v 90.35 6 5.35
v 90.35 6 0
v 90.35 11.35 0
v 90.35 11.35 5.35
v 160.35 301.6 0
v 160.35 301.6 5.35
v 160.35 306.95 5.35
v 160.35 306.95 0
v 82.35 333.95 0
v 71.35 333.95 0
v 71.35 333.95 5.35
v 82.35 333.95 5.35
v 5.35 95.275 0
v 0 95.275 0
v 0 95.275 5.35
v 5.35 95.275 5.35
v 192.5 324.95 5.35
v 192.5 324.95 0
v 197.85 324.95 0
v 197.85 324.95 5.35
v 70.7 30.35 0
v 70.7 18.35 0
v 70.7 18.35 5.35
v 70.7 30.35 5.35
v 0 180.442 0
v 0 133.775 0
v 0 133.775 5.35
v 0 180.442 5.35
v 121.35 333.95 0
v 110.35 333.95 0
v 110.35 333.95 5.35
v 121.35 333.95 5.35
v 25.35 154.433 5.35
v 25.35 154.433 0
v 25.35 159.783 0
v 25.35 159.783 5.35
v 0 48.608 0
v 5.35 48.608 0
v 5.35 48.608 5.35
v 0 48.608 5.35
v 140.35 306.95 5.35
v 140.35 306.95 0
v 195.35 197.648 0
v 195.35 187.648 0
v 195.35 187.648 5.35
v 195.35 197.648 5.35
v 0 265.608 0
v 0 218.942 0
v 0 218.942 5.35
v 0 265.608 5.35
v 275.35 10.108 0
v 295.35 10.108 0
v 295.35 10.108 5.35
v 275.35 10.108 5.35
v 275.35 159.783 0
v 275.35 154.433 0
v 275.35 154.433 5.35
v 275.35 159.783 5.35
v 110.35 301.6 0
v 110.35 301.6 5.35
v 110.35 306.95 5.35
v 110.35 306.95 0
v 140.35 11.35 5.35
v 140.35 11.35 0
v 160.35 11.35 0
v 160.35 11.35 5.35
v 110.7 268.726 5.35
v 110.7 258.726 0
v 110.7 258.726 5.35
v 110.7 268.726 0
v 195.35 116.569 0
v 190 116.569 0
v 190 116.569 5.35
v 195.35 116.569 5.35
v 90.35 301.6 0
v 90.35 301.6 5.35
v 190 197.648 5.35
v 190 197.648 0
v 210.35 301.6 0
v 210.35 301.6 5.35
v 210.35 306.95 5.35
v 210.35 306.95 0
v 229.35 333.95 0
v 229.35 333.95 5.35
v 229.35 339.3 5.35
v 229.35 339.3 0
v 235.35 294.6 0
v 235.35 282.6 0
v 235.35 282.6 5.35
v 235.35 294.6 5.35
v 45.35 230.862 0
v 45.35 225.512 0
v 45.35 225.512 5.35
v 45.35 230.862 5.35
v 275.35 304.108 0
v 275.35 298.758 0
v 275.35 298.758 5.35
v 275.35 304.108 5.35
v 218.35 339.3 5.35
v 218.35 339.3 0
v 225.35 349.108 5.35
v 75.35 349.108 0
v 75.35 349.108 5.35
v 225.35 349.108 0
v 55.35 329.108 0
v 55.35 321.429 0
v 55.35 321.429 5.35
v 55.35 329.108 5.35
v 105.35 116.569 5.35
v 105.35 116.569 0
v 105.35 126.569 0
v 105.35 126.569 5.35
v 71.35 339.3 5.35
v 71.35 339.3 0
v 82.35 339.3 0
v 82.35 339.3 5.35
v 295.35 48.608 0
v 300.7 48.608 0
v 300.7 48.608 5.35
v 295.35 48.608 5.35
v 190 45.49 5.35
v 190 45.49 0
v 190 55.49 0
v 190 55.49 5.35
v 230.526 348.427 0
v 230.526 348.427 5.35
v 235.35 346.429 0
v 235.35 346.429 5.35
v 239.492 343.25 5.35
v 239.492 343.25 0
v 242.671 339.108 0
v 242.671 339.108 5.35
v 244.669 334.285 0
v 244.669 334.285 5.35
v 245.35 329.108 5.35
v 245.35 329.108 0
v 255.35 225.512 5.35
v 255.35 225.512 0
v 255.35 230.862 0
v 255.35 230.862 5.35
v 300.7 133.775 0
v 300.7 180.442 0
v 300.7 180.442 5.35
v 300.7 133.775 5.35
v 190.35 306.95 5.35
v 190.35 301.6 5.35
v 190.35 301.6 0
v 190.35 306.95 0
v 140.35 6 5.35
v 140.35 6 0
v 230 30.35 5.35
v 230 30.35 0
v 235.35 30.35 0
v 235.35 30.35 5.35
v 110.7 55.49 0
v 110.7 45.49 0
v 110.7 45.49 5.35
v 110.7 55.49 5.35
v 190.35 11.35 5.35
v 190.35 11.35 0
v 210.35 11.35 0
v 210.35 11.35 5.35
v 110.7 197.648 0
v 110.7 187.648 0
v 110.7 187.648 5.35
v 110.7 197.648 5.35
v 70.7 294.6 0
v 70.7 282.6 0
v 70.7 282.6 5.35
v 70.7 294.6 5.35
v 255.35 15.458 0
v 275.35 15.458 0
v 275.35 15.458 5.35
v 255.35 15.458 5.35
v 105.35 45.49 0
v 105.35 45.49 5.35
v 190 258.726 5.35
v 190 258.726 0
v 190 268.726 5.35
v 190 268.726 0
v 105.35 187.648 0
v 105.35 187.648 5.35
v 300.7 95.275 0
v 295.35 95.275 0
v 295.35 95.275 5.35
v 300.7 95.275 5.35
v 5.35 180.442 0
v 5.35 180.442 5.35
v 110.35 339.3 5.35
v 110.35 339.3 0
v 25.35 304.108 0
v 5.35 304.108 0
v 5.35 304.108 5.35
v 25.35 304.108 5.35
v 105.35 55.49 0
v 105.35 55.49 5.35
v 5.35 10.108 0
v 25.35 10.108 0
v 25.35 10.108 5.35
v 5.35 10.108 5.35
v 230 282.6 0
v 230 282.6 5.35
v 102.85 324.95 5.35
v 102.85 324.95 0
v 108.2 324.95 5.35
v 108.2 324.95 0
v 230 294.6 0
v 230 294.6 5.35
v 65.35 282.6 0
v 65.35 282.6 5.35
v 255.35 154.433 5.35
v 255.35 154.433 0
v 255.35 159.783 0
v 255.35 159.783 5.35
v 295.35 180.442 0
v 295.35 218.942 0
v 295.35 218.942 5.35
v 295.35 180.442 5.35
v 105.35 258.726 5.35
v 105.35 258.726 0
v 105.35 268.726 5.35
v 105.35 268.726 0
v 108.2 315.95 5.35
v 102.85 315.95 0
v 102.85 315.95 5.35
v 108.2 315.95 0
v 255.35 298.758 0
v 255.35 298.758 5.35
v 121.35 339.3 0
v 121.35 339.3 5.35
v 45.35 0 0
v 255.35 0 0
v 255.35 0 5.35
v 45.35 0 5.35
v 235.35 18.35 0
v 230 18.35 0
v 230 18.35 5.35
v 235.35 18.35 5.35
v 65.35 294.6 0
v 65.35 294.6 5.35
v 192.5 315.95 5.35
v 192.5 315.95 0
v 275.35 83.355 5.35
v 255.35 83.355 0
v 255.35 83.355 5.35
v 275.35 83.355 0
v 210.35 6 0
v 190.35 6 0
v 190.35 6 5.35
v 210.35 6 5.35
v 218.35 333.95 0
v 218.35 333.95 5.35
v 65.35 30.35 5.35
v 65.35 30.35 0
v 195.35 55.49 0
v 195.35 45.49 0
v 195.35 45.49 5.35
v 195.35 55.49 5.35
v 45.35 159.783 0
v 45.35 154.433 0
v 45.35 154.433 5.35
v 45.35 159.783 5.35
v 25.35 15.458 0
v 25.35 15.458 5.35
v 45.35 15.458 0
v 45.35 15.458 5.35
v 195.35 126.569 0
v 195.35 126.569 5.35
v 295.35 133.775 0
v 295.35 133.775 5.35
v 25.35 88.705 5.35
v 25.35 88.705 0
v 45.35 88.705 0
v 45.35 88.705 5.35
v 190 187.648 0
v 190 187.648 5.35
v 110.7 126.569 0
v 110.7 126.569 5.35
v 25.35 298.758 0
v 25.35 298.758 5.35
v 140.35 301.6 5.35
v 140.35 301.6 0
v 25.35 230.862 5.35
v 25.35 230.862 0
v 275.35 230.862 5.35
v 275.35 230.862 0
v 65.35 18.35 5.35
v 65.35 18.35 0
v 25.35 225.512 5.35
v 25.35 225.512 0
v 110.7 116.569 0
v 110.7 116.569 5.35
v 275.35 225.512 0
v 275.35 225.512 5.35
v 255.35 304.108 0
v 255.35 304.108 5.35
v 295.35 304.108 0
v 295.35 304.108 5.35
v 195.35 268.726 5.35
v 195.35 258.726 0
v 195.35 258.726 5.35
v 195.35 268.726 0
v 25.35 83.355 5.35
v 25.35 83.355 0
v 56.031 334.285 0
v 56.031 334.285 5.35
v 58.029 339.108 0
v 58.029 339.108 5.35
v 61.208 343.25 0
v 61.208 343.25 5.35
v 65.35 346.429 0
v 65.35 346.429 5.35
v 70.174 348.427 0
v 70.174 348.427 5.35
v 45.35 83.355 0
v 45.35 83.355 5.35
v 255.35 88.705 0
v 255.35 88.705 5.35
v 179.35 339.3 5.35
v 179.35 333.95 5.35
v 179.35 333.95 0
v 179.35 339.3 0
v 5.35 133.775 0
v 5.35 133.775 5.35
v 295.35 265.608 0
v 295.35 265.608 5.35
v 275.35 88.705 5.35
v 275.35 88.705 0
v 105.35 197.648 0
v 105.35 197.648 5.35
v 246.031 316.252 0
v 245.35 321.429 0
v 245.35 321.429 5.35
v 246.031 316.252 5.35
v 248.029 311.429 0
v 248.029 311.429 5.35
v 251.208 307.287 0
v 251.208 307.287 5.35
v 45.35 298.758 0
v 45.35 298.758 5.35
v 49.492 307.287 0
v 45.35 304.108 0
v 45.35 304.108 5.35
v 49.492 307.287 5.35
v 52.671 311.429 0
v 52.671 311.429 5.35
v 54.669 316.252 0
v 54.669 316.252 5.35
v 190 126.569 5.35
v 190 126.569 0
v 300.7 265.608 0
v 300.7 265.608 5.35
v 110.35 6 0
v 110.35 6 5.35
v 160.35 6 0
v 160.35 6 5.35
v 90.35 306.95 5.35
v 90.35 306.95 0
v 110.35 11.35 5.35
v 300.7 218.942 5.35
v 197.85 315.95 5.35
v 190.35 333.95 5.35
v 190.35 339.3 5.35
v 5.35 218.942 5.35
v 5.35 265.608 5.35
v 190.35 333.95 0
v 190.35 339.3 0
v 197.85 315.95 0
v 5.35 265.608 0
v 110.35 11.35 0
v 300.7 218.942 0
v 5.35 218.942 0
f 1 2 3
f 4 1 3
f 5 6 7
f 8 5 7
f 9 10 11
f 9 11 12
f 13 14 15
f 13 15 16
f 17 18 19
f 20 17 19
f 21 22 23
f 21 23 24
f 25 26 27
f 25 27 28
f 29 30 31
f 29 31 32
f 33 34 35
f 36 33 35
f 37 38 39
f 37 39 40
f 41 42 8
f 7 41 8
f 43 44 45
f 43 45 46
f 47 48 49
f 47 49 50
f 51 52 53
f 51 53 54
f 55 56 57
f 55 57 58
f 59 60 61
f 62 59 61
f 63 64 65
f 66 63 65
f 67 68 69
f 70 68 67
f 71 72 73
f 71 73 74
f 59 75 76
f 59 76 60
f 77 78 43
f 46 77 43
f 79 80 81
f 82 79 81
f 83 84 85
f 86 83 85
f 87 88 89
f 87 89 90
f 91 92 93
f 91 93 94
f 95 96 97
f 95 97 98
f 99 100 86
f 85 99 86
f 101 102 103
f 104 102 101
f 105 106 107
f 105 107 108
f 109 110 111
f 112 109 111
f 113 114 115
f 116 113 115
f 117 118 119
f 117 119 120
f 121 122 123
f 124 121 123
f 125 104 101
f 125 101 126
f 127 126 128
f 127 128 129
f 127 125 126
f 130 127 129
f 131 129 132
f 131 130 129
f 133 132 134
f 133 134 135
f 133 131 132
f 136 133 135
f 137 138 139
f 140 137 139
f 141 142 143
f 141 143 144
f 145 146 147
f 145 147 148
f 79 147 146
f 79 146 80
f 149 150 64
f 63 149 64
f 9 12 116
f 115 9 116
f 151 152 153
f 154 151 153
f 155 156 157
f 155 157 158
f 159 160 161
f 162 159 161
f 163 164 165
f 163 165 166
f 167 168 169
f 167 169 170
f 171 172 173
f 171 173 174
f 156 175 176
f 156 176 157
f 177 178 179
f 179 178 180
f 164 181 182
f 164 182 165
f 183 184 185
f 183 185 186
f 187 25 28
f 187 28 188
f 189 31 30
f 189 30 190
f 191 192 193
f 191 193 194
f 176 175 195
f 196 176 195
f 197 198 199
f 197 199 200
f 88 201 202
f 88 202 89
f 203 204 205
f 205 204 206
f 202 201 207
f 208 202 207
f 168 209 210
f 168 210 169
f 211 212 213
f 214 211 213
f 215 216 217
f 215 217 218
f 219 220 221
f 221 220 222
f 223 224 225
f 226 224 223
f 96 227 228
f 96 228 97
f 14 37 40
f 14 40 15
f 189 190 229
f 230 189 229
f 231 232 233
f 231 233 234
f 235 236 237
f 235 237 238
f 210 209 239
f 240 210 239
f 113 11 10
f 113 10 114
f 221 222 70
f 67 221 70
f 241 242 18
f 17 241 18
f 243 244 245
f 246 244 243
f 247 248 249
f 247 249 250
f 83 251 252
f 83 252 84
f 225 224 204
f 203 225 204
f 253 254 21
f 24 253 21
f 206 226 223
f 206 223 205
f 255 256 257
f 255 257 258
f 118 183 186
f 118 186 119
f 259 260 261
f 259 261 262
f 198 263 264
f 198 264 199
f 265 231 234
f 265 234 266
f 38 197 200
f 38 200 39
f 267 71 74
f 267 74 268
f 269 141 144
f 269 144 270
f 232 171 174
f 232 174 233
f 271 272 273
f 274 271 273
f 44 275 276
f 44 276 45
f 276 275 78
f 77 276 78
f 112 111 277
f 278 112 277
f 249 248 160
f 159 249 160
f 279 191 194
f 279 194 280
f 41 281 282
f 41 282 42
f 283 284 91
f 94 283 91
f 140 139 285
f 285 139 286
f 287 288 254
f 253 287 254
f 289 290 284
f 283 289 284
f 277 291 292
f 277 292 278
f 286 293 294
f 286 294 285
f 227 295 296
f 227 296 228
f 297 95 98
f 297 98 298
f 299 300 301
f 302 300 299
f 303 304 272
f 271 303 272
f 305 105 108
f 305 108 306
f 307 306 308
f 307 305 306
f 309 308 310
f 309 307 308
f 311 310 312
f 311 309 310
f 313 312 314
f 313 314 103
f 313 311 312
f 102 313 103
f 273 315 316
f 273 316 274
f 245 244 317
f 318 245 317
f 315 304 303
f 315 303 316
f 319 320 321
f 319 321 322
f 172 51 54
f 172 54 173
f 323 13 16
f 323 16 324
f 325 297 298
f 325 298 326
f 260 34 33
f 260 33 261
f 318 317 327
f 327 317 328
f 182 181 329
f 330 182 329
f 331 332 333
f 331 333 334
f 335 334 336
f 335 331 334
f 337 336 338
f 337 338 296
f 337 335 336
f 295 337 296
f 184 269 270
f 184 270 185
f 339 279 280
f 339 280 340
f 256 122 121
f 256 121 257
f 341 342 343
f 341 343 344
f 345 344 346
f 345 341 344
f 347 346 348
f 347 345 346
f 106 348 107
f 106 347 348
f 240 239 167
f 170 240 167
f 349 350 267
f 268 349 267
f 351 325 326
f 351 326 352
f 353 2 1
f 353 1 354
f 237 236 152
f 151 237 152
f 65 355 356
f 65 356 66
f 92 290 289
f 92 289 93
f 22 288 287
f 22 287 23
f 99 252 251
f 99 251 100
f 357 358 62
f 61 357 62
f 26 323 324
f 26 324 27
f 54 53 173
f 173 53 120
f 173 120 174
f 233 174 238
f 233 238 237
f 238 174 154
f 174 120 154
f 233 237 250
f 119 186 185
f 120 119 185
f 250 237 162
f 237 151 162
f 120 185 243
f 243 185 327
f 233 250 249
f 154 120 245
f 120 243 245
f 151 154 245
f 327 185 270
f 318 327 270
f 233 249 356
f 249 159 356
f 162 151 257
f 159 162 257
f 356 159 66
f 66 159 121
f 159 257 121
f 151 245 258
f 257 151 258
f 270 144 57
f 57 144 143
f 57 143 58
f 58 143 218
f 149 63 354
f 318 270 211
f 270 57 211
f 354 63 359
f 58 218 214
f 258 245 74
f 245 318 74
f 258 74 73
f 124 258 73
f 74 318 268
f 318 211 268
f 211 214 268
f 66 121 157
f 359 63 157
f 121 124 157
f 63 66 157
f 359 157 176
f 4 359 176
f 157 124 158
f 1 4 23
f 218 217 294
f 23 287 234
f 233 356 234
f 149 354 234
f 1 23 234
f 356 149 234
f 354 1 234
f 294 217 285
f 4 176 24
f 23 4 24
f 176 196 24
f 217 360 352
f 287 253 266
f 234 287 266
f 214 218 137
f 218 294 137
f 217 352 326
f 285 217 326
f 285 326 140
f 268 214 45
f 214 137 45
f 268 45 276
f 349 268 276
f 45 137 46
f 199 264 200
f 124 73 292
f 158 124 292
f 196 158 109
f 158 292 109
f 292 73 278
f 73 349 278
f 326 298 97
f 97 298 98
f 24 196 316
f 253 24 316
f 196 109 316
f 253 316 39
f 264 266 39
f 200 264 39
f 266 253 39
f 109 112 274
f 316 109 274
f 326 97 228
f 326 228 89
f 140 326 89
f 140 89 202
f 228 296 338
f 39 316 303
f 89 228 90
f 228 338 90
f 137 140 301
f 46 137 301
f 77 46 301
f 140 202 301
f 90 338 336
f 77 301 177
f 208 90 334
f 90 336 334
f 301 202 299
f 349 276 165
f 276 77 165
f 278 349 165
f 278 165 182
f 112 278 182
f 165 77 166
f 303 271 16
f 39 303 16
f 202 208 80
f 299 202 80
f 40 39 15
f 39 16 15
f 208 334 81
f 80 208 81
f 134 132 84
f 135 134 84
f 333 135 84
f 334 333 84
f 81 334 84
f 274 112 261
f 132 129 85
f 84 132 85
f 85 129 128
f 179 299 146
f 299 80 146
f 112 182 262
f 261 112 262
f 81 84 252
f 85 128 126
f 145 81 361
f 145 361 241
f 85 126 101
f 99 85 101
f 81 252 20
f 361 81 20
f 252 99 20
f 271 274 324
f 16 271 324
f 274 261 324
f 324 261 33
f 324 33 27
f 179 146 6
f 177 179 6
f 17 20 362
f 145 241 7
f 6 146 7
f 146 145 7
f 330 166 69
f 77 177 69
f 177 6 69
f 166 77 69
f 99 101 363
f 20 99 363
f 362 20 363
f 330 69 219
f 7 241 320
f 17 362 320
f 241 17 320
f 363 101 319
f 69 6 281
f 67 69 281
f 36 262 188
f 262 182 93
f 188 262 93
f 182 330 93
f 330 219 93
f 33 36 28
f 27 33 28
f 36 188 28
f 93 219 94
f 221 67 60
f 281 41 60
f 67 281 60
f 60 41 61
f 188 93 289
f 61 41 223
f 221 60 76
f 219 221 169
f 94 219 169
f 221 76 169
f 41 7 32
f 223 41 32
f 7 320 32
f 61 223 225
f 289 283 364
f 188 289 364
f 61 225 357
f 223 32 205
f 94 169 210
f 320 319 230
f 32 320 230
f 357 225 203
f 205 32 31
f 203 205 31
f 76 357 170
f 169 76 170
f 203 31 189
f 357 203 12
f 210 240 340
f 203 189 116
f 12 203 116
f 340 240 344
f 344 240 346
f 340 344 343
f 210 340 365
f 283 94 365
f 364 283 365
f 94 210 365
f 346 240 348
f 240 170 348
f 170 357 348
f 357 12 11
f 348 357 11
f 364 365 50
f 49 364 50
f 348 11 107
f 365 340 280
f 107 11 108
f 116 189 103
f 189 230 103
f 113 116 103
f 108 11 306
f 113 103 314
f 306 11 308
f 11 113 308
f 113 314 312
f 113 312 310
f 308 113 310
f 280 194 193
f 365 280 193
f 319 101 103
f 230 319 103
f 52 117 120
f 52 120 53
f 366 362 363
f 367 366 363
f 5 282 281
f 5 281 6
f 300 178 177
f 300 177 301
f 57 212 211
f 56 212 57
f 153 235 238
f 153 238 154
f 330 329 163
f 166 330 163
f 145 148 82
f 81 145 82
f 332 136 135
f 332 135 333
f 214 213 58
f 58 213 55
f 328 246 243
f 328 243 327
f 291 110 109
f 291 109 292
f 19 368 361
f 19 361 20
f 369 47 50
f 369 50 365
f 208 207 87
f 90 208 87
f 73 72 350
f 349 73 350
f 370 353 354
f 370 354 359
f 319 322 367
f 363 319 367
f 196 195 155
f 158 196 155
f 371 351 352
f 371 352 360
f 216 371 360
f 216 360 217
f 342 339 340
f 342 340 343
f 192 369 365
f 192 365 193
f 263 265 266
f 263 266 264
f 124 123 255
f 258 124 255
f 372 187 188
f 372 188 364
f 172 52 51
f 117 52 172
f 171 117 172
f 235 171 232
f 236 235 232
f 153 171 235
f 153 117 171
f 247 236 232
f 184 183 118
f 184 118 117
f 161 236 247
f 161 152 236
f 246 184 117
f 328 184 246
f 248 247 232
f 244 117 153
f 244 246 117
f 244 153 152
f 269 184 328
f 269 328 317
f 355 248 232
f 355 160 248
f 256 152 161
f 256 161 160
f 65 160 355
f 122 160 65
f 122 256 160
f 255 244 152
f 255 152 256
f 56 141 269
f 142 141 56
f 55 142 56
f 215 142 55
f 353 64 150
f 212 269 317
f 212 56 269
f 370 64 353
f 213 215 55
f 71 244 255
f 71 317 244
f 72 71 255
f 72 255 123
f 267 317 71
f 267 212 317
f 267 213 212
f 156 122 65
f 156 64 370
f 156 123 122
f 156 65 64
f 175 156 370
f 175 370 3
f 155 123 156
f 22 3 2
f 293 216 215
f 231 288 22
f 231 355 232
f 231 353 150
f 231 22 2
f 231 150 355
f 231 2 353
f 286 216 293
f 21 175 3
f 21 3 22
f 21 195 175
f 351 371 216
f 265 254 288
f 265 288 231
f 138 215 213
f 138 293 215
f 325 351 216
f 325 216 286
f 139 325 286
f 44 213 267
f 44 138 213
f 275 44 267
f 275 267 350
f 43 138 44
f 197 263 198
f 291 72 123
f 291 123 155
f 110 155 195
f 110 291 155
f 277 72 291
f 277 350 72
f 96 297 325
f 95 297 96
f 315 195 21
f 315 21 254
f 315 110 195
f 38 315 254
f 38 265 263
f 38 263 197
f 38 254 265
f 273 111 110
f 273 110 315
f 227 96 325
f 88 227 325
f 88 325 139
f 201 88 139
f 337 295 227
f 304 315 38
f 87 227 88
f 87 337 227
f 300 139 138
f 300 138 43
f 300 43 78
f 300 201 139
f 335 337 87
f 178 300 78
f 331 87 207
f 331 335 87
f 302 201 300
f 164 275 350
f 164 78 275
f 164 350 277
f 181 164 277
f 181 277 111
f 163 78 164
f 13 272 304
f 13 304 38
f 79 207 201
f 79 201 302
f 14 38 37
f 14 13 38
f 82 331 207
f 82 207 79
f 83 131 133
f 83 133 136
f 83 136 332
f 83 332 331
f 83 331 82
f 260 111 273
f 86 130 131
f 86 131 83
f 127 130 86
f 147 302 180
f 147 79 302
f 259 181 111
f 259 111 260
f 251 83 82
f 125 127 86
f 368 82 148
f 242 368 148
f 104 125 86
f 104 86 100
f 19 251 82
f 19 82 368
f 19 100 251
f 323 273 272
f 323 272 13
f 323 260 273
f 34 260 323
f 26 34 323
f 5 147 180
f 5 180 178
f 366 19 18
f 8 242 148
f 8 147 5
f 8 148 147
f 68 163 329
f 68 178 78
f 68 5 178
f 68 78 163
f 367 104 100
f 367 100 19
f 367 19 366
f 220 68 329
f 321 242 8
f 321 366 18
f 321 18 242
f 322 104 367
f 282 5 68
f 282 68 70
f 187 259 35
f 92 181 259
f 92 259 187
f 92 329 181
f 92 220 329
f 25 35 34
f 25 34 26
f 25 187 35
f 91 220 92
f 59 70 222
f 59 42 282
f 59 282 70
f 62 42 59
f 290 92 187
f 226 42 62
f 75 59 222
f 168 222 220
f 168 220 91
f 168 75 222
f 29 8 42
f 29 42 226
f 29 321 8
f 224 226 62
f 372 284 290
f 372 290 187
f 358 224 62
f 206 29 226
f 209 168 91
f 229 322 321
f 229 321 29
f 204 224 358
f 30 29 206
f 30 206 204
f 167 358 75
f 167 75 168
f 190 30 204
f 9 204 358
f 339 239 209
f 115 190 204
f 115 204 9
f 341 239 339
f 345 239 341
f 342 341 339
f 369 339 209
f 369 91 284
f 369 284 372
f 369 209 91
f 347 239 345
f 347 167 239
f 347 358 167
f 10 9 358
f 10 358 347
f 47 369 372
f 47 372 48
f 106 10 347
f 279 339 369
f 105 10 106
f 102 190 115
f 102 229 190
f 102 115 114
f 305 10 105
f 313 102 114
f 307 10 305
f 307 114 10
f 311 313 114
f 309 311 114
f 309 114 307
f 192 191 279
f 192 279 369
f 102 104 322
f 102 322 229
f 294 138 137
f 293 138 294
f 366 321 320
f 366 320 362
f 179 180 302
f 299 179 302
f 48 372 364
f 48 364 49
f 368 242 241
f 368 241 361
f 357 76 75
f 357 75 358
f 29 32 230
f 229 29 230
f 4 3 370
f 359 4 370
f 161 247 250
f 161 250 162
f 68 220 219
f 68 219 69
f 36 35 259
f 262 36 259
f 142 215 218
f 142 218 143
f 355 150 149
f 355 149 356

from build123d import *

# Parameters (mm, degrees)
MODEL_W             = 10.99999994
MODEL_H             = 5.349999293
MODEL_W_2           = 5.350001157
MODEL_H_2           = 10.000001639
MODEL_H_3           = 9.999997913
MODEL_H_4           = 10.000005364
MODEL_H_5           = 9.999990463
MODEL_W_3           = 19.999999553
MODEL_H_6           = 5.350001156
MODEL_H_7           = 5.349993706
MODEL_H_8           = 5.350008607
MODEL_W_4           = 5.350001156
MODEL_H_9           = 8.999999612
MODEL_W_5           = 5.350004882
MODEL_H_10          = 12.000000104
MODEL_W_6           = 19.999988377
MODEL_W_7           = 19.999995828
MODEL_H_11          = 5.349999992
MODEL_H_12          = 11.999994516
MODEL_W_8           = 10.999999941
BOSS_EXTRUDE1_DEPTH = 5.35


with BuildPart() as part:
    # Model → Boss-Extrude1 (new body)
    with BuildSketch(Plane.XY):
        with BuildLine():
            Line((295.349999331, 304.108172655), (295.349999331, 265.608172864))
            Line((295.349999331, 265.608172864), (300.699999556, 265.608172864))
            Line((300.699999556, 265.608172864), (300.699999556, 218.941502273))
            Line((300.699999556, 218.941502273), (295.349999331, 218.941502273))
            Line((295.349999331, 218.941502273), (295.349999331, 180.441506207))
            Line((295.349999331, 180.441506207), (300.699999556, 180.441506207))
            Line((300.699999556, 180.441506207), (300.699999556, 133.774831891))
            Line((300.699999556, 133.774831891), (295.349999331, 133.774831891))
            Line((295.349999331, 133.774831891), (295.349999331, 95.274835825))
            Line((295.349999331, 95.274835825), (300.699999556, 95.274835825))
            Line((300.699999556, 95.274835825), (300.699999556, 48.608183861))
            Line((300.699999556, 48.608183861), (295.349999331, 48.608183861))
            Line((295.349999331, 48.608183861), (295.349999331, 10.108172894))
            Line((295.349999331, 10.108172894), (275.349999778, 10.108172894))
            Line((275.349999778, 10.108172894), (275.349999778, 15.458166599))
            Line((275.349999778, 15.458166599), (255.350000225, 15.458166599))
            Line((255.350000225, 15.458166599), (255.350000225, 0))
            Line((255.350000225, 0), (45.349999331, 0))
            Line((45.349999331, 0), (45.349999331, 15.458166599))
            Line((45.349999331, 15.458166599), (25.349999778, 15.458166599))
            Line((25.349999778, 15.458166599), (25.349999778, 10.108172894))
            Line((25.349999778, 10.108172894), (5.350000225, 10.108172894))
            Line((5.350000225, 10.108172894), (5.350000225, 48.608183861))
            Line((5.350000225, 48.608183861), (0, 48.608183861))
            Line((0, 48.608183861), (0, 95.274835825))
            Line((0, 95.274835825), (5.350000225, 95.274835825))
            Line((5.350000225, 95.274835825), (5.350000225, 133.774831891))
            Line((5.350000225, 133.774831891), (0, 133.774831891))
            Line((0, 133.774831891), (0, 180.441506207))
            Line((0, 180.441506207), (5.350000225, 180.441506207))
            Line((5.350000225, 180.441506207), (5.350000225, 218.941502273))
            Line((5.350000225, 218.941502273), (0, 218.941502273))
            Line((0, 218.941502273), (0, 265.608172864))
            Line((0, 265.608172864), (5.350000225, 265.608172864))
            Line((5.350000225, 265.608172864), (5.350000225, 304.108172655))
            Line((5.350000225, 304.108172655), (25.349999778, 304.108172655))
            Line((25.349999778, 304.108172655), (25.349999778, 298.75817243))
            Line((25.349999778, 298.75817243), (45.349999331, 298.75817243))
            Line((45.349999331, 298.75817243), (45.349999331, 304.108172655))
            ThreePointArc((45.349999331, 304.108172655), (52.670508573, 311.428680858), (55.35000097, 321.428681677))
            Line((55.35000097, 321.428681677), (55.35000097, 329.108174443))
            ThreePointArc((55.35000097, 329.108174443), (61.207865188, 343.250309909), (75.350000523, 349.108174443))
            Line((75.350000523, 349.108174443), (225.349999033, 349.108174443))
            ThreePointArc((225.349999033, 349.108174443), (239.492134368, 343.250309909), (245.349998586, 329.108174443))
            Line((245.349998586, 329.108174443), (245.349998586, 321.428681677))
            ThreePointArc((245.349998586, 321.428681677), (248.029490983, 311.428680858), (255.350000225, 304.108172655))
            Line((255.350000225, 304.108172655), (255.350000225, 298.75817243))
            Line((255.350000225, 298.75817243), (275.349999778, 298.75817243))
            Line((275.349999778, 298.75817243), (275.349999778, 304.108172655))
            Line((275.349999778, 304.108172655), (295.349999331, 304.108172655))
        make_face()
        with Locations((223.849999718, 336.625010707)):
            Rectangle(MODEL_W, MODEL_H, mode=Mode.SUBTRACT)
        with Locations((184.850002639, 336.625010707)):
            Rectangle(MODEL_W, MODEL_H, mode=Mode.SUBTRACT)
        with Locations((108.025002294, 263.726172969)):
            Rectangle(MODEL_W_2, MODEL_H_2, mode=Mode.SUBTRACT)
        with Locations((108.025002294, 192.647505552)):
            Rectangle(MODEL_W_2, MODEL_H_3, mode=Mode.SUBTRACT)
        with Locations((108.025002294, 121.568836272)):
            Rectangle(MODEL_W_2, MODEL_H_4, mode=Mode.SUBTRACT)
        with Locations((108.025002294, 50.490170718)):
            Rectangle(MODEL_W_2, MODEL_H_5, mode=Mode.SUBTRACT)
        with Locations((35.349999555, 228.186842054)):
            Rectangle(MODEL_W_3, MODEL_H_6, mode=Mode.SUBTRACT)
        with Locations((35.349999555, 157.108172774)):
            Rectangle(MODEL_W_3, MODEL_H_7, mode=Mode.SUBTRACT)
        with Locations((35.349999555, 86.02950722)):
            Rectangle(MODEL_W_3, MODEL_H_8, mode=Mode.SUBTRACT)
        with Locations((105.524997227, 320.450009778)):
            Rectangle(MODEL_W_4, MODEL_H_9, mode=Mode.SUBTRACT)
        with Locations((68.025001325, 288.600009866)):
            Rectangle(MODEL_W_5, MODEL_H_10, mode=Mode.SUBTRACT)
        with Locations((150.349999777, 8.675009012)):
            Rectangle(MODEL_W_6, MODEL_H_7, mode=Mode.SUBTRACT)
        with Locations((200.350000523, 8.675009012)):
            Rectangle(MODEL_W_7, MODEL_H_7, mode=Mode.SUBTRACT)
        with Locations((100.349999033, 304.275010363)):
            Rectangle(MODEL_W_7, MODEL_H_11, mode=Mode.SUBTRACT)
        with Locations((150.349999777, 304.275010363)):
            Rectangle(MODEL_W_6, MODEL_H_11, mode=Mode.SUBTRACT)
        with Locations((232.674998231, 24.350002408)):
            Rectangle(MODEL_W_5, MODEL_H_12, mode=Mode.SUBTRACT)
        with Locations((68.025001325, 24.350002408)):
            Rectangle(MODEL_W_5, MODEL_H_12, mode=Mode.SUBTRACT)
        with Locations((100.349999033, 8.675009012)):
            Rectangle(MODEL_W_7, MODEL_H_7, mode=Mode.SUBTRACT)
        with Locations((200.350000523, 304.275010363)):
            Rectangle(MODEL_W_7, MODEL_H_11, mode=Mode.SUBTRACT)
        with Locations((232.674998231, 288.600009866)):
            Rectangle(MODEL_W_5, MODEL_H_10, mode=Mode.SUBTRACT)
        with Locations((115.849996917, 336.625010707)):
            Rectangle(MODEL_W, MODEL_H, mode=Mode.SUBTRACT)
        with Locations((76.849999838, 336.625010707)):
            Rectangle(MODEL_W_8, MODEL_H, mode=Mode.SUBTRACT)
        with Locations((195.175002329, 320.450009778)):
            Rectangle(MODEL_W_4, MODEL_H_9, mode=Mode.SUBTRACT)
        with Locations((265.350000002, 86.02950722)):
            Rectangle(MODEL_W_3, MODEL_H_8, mode=Mode.SUBTRACT)
        with Locations((265.350000002, 157.108172774)):
            Rectangle(MODEL_W_3, MODEL_H_7, mode=Mode.SUBTRACT)
        with Locations((265.350000002, 228.186842054)):
            Rectangle(MODEL_W_3, MODEL_H_6, mode=Mode.SUBTRACT)
        with Locations((192.674997263, 50.490170718)):
            Rectangle(MODEL_W_2, MODEL_H_5, mode=Mode.SUBTRACT)
        with Locations((192.674997263, 121.568836272)):
            Rectangle(MODEL_W_2, MODEL_H_4, mode=Mode.SUBTRACT)
        with Locations((192.674997263, 192.647505552)):
            Rectangle(MODEL_W_2, MODEL_H_3, mode=Mode.SUBTRACT)
        with Locations((192.674997263, 263.726172969)):
            Rectangle(MODEL_W_2, MODEL_H_2, mode=Mode.SUBTRACT)
    extrude(amount=BOSS_EXTRUDE1_DEPTH)


solid = part.part
